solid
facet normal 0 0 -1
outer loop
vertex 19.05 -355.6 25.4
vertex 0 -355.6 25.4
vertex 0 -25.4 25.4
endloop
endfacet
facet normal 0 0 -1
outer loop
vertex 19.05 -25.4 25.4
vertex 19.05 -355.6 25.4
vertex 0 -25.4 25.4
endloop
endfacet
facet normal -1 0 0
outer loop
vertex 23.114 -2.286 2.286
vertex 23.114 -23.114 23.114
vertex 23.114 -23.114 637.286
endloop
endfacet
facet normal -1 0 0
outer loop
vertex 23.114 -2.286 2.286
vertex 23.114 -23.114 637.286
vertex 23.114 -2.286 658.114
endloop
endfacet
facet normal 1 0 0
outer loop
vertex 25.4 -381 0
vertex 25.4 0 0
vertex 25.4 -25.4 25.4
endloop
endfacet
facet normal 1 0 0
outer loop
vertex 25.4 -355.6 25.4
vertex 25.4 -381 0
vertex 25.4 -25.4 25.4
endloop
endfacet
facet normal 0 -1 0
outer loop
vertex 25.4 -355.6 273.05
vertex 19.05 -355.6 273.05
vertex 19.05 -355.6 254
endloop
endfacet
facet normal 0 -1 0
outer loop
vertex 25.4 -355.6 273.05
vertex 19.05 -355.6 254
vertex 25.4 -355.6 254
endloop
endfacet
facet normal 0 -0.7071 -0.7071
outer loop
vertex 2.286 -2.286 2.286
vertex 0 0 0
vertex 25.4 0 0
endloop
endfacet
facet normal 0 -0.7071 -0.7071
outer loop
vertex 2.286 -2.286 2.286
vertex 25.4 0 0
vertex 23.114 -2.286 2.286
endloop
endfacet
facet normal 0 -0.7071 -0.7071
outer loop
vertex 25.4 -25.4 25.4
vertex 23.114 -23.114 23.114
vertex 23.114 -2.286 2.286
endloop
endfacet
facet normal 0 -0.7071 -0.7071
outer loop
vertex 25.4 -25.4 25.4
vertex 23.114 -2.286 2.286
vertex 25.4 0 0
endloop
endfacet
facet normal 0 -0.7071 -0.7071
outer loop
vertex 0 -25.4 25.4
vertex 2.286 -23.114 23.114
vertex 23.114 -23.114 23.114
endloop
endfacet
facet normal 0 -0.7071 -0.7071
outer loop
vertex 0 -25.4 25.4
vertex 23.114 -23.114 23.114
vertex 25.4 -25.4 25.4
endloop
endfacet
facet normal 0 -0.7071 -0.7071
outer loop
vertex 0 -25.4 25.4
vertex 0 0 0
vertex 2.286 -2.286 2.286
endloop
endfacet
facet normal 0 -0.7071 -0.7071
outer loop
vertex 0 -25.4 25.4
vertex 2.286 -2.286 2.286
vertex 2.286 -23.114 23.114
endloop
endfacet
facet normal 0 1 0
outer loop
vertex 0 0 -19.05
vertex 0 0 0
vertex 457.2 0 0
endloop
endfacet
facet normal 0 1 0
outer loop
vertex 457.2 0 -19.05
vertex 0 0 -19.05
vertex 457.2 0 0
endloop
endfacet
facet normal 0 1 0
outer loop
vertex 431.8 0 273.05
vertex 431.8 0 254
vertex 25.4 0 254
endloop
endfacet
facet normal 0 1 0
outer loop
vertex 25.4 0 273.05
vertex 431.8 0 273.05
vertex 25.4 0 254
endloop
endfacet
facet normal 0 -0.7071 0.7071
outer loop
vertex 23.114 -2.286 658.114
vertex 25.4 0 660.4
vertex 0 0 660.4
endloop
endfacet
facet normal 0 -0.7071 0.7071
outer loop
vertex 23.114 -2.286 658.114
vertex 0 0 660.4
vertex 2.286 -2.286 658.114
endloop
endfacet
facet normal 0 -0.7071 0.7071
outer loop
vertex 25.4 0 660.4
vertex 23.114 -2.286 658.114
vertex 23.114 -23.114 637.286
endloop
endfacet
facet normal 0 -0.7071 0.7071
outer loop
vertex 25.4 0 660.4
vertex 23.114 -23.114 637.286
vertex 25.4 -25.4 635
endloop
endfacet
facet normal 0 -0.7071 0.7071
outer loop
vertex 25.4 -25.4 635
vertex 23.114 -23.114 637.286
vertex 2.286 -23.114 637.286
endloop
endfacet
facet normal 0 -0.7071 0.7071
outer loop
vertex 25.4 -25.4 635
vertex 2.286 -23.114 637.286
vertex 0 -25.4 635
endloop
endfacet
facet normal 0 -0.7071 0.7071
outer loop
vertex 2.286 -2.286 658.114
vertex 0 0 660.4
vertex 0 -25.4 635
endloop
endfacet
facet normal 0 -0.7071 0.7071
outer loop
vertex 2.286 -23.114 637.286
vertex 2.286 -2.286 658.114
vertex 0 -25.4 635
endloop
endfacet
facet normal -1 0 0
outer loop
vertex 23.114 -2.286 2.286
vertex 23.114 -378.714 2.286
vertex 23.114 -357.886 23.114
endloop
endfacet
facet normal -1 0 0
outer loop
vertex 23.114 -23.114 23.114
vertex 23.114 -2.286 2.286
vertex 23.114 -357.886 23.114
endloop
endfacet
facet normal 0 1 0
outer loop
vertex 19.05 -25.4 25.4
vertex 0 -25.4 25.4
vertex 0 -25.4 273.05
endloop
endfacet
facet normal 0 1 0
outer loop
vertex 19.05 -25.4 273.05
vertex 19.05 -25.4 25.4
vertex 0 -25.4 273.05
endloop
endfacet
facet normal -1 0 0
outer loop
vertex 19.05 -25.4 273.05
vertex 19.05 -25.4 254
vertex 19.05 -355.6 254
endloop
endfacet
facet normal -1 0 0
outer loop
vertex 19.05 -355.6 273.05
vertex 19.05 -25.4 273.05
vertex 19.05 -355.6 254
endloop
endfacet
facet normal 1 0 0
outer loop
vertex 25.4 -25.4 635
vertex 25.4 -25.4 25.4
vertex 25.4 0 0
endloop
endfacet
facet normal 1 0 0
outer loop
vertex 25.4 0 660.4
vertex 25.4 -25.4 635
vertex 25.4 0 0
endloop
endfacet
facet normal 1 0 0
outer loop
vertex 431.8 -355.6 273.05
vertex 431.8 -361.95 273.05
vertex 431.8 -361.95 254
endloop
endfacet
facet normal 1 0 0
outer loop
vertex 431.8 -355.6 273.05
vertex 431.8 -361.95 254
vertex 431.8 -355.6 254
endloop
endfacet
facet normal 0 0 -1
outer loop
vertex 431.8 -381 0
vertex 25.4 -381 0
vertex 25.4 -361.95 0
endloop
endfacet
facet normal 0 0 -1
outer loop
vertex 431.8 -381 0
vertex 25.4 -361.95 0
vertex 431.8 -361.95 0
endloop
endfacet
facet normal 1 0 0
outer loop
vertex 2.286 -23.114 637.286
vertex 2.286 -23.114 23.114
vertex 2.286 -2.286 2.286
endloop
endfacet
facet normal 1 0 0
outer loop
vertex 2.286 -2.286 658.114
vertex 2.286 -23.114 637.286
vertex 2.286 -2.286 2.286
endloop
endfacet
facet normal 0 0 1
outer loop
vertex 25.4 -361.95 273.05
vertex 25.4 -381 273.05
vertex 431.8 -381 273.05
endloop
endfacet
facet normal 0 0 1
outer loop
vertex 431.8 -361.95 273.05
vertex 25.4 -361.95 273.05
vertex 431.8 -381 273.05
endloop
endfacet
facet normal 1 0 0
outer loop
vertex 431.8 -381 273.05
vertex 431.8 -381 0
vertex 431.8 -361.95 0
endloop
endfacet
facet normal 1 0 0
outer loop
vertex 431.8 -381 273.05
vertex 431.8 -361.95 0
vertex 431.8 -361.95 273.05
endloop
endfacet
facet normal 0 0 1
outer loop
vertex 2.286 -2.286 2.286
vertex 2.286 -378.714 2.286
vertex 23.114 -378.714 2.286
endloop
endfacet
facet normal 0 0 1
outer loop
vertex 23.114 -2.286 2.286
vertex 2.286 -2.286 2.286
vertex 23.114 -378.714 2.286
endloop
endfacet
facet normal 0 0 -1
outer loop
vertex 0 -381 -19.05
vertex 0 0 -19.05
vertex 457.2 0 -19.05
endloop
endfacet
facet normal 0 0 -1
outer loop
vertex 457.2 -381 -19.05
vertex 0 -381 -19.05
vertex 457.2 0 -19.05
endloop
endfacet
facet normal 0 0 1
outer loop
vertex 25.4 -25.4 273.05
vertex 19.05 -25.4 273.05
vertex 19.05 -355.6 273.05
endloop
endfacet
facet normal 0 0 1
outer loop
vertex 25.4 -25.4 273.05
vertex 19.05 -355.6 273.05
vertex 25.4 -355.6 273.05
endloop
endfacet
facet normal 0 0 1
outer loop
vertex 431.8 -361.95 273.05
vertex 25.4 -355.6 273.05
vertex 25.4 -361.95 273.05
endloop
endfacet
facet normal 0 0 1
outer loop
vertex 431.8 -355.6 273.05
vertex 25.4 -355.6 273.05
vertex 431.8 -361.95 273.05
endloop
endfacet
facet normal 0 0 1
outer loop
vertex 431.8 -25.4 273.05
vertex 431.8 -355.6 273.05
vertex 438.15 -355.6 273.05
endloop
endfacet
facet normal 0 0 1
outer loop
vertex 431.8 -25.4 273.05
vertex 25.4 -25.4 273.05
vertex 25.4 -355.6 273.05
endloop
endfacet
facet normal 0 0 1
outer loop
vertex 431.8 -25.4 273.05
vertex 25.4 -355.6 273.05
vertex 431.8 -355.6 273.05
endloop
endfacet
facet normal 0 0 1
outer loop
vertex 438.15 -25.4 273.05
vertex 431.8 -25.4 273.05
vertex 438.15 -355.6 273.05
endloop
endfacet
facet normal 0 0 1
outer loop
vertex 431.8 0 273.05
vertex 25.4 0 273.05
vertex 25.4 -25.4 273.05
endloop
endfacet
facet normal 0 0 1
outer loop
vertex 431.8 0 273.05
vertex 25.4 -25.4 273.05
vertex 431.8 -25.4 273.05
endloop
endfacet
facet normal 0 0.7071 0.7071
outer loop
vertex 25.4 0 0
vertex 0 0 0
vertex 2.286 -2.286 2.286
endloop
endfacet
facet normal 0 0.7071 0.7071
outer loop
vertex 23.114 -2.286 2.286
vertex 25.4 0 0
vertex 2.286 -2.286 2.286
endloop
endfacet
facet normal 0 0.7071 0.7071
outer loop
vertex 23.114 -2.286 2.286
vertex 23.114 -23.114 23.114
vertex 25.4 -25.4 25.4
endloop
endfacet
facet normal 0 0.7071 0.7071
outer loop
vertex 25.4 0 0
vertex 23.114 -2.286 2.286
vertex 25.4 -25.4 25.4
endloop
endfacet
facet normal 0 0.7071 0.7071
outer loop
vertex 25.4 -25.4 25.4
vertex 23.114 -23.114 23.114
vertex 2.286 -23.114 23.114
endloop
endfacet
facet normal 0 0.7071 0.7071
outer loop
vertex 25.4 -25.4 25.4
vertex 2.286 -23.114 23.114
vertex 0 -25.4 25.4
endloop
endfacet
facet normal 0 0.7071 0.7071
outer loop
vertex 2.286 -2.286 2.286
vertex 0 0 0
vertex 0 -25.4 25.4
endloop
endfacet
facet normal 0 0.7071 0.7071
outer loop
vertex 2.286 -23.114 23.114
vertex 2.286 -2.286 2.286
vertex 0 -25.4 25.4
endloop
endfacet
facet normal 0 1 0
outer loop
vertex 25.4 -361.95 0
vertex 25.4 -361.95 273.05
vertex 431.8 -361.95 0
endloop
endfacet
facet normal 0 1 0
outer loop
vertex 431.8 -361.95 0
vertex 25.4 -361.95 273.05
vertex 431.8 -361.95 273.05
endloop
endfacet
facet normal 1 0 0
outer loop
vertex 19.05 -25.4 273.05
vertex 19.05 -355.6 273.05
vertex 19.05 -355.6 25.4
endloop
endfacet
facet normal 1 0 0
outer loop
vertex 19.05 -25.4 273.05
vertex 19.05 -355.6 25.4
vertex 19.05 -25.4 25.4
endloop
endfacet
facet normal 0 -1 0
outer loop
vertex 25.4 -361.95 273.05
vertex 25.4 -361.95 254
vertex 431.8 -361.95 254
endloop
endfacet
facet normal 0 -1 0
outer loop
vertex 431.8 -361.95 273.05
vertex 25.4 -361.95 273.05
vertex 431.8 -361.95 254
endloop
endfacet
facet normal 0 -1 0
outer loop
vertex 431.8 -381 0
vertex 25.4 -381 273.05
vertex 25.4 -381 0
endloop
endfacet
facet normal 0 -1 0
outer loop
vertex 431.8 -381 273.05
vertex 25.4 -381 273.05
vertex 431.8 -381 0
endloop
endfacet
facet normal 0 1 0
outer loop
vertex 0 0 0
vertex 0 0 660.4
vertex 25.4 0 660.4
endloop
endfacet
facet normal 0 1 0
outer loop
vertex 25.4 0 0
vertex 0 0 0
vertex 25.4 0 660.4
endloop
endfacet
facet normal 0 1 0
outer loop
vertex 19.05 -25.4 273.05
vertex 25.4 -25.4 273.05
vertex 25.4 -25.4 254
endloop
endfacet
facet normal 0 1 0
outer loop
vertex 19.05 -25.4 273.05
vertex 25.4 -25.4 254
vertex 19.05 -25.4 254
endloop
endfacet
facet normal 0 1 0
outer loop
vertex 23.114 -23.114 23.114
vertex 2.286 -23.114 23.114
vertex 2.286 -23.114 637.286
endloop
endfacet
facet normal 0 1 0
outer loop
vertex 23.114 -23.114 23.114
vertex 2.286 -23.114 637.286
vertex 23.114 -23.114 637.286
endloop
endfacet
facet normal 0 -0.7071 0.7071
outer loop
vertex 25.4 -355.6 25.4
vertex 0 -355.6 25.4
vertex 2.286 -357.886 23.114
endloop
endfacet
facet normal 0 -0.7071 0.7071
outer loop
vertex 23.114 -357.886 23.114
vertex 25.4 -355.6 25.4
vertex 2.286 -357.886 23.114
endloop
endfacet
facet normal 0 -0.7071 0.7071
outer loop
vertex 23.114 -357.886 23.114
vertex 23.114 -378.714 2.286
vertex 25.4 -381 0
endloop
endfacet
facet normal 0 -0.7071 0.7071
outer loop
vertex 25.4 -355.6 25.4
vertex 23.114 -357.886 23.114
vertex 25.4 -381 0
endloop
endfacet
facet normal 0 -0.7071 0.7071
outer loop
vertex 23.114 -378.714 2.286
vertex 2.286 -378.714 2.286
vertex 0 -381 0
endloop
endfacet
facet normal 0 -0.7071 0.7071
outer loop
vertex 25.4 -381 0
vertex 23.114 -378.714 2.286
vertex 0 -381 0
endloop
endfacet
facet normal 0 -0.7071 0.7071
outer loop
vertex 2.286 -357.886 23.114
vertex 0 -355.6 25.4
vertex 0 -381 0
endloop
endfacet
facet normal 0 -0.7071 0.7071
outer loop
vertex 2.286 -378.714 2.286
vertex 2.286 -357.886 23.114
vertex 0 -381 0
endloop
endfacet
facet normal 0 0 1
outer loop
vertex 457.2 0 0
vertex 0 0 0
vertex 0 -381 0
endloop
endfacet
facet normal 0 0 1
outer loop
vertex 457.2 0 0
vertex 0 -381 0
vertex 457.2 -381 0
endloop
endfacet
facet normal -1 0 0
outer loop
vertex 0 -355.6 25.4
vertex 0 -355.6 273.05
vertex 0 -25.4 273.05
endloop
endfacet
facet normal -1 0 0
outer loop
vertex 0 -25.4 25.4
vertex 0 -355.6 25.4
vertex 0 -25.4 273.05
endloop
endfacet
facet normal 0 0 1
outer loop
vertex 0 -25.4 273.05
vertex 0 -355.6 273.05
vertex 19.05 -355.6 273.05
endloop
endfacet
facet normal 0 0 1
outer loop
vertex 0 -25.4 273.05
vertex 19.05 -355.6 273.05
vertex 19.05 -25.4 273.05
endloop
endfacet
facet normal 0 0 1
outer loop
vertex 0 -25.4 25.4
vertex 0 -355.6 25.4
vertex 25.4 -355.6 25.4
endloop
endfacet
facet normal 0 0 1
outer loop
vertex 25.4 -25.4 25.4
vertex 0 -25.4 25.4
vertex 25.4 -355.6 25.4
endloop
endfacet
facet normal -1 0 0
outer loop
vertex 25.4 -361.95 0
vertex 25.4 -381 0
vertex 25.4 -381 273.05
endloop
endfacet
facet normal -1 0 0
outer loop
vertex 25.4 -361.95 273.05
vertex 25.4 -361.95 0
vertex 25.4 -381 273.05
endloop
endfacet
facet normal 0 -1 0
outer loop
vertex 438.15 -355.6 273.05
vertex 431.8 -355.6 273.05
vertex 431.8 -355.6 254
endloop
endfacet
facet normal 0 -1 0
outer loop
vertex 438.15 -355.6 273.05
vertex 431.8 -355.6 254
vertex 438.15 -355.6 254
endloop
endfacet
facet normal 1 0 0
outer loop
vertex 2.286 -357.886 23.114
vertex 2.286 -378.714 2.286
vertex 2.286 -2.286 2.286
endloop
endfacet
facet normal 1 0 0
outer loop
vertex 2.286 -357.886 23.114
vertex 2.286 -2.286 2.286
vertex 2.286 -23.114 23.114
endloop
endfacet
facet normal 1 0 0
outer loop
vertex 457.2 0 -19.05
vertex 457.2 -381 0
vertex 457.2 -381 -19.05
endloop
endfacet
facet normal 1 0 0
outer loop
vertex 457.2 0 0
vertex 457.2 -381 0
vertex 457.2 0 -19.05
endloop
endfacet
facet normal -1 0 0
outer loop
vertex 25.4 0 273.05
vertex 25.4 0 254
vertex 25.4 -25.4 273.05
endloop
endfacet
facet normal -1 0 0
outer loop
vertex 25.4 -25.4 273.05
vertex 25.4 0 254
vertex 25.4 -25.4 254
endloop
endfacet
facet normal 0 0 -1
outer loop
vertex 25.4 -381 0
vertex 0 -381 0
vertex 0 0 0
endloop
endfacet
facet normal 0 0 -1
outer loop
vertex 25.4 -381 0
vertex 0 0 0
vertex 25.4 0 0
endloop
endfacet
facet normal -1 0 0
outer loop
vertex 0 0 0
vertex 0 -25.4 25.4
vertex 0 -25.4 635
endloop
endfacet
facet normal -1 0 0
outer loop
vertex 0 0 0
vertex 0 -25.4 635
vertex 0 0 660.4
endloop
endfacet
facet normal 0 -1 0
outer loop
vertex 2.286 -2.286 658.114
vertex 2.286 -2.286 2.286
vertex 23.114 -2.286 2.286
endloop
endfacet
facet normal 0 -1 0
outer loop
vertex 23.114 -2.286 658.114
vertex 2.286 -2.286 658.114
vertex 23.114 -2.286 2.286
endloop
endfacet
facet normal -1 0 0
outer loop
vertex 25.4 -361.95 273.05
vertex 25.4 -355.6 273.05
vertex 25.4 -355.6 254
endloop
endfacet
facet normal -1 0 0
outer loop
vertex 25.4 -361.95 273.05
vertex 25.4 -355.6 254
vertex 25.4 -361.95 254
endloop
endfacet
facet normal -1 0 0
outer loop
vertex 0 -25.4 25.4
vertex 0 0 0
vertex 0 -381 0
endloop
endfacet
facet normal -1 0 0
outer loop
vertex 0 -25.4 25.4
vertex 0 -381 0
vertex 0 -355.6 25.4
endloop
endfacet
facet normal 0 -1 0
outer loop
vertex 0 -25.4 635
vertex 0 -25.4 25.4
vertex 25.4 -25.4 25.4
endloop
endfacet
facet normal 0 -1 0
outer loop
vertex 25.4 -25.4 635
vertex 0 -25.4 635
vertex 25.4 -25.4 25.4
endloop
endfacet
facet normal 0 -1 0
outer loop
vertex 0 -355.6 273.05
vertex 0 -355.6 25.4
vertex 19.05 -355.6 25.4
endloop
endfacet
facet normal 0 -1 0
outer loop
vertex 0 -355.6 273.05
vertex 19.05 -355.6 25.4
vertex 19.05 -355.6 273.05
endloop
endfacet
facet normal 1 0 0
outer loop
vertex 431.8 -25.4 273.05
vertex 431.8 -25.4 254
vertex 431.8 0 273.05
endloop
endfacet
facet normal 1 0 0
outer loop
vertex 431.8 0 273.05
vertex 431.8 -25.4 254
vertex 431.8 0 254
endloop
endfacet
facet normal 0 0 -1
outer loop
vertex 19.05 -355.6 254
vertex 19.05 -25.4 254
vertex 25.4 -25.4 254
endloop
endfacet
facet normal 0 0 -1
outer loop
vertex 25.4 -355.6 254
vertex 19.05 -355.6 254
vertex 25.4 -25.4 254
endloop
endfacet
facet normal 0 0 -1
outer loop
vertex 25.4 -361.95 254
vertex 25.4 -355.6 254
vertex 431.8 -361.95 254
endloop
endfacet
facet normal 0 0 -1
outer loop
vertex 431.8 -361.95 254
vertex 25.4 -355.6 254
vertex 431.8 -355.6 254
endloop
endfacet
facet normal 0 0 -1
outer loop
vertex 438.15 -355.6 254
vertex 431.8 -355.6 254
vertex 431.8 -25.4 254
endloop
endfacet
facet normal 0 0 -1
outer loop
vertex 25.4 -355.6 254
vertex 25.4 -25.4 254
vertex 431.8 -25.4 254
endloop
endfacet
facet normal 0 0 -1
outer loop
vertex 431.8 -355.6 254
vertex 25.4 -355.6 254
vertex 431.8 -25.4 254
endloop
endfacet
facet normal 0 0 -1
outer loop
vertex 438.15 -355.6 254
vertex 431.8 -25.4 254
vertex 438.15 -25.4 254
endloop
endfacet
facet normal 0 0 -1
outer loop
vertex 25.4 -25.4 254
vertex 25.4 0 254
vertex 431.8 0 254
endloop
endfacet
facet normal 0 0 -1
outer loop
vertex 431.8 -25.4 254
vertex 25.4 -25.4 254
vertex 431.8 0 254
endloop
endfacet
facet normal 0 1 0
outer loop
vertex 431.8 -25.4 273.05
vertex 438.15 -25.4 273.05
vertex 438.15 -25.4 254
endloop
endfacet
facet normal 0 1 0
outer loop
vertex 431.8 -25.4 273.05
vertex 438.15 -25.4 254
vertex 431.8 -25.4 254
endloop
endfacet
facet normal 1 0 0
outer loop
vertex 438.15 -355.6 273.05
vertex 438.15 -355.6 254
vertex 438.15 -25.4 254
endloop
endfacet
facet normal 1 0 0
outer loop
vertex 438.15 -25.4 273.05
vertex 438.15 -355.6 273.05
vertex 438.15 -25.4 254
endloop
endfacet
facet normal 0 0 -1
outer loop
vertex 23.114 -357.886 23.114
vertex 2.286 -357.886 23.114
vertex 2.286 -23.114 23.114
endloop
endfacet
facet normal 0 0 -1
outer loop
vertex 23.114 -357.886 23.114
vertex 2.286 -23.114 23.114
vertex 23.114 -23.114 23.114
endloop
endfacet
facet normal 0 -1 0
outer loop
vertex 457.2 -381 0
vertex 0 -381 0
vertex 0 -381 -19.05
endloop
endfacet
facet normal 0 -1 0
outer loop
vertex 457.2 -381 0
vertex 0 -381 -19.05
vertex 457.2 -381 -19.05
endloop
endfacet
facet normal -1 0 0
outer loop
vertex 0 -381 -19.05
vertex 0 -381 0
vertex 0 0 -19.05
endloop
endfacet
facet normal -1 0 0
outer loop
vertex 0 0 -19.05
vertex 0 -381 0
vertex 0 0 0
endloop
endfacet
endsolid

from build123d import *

# Parameters (mm, degrees)
F0_W      = 25.4
F0_H      = 25.4
F0_W_2    = 20.828
F0_H_2    = 20.828
F1_DEPTH  = 660.4
F3_DEPTH  = 25.4
F5_DEPTH  = 25.4
F6_W      = 25.4
F6_H      = 25.4
F6_W_2    = 20.828
F6_H_2    = 20.828
F7_DEPTH  = 381
F9_DEPTH  = 25.4
F10_W     = 457.2
F10_H     = 381
F11_DEPTH = 19.05
F14_DEPTH = 19.05
F15_W     = 330.2
F15_H     = 247.65
F16_DEPTH = 19.05
F17_W     = 406.4
F17_H     = 273.05
F18_DEPTH = 19.05


with BuildPart() as f1:
    # F0 (on Top) → F1 (new body)
    with BuildSketch(Plane.XY):
        with Locations((12.7, -12.7)):
            Rectangle(F0_W, F0_H)
        with Locations((12.7, -12.7)):
            Rectangle(F0_W_2, F0_H_2, mode=Mode.SUBTRACT)
    extrude(amount=F1_DEPTH)

    # F2 (on Right) → F3 (cut)
    with BuildSketch(Plane.YZ):
        Polygon((-25.4, 0), (0, 0), (-25.4, 25.4), align=None)
    extrude(amount=F3_DEPTH, mode=Mode.SUBTRACT)

    # F4 (on face) → F5 (cut, through all)
    with BuildSketch(Plane(origin=(0, 0, 0), x_dir=(0, -1, 0), z_dir=(-1, 0, 0))):
        Polygon((25.4, 660.4), (0, 660.4), (25.4, 635), align=None)
    extrude(amount=-F5_DEPTH, mode=Mode.SUBTRACT)


with BuildPart() as f7:
    # F6 (on Front) → F7 (new body)
    with BuildSketch(Plane.XZ):
        with Locations((12.7, 12.7)):
            Rectangle(F6_W, F6_H)
        with Locations((12.7, 12.7)):
            Rectangle(F6_W_2, F6_H_2, mode=Mode.SUBTRACT)
    extrude(amount=F7_DEPTH)

    # F8 (on face) → F9 (cut, through all)
    with BuildSketch(Plane(origin=(0, 0, 0), x_dir=(0, -1, 0), z_dir=(-1, 0, 0))):
        Polygon((355.6, 25.4), (381, 0), (381, 25.4), align=None)
        Polygon((0, 25.4), (0, 0), (25.4, 25.4), align=None)
    extrude(amount=-F9_DEPTH, mode=Mode.SUBTRACT)


with BuildPart() as f11:
    # F10 (on Top) → F11 (new body)
    with BuildSketch(Plane.XY):
        with Locations((228.6, -190.5)):
            Rectangle(F10_W, F10_H)
    extrude(amount=-F11_DEPTH)


with BuildPart() as f14:
    # F13 (on offset) → F14 (new body)
    with BuildSketch(Plane.XY.offset(254)):
        Polygon((431.8, 0), (25.4, 0), (25.4, -25.4), (19.05, -25.4), (19.05, -355.6), (25.4000000002, -355.6), (25.4, -361.95), (431.8, -361.95), (431.8, -355.6), (438.15, -355.6), (438.15, -25.4), (431.8, -25.4), align=None)
    extrude(amount=F14_DEPTH)


with BuildPart() as f16:
    # F15 (on Right) → F16 (new body)
    with BuildSketch(Plane.YZ):
        with Locations((-190.5, 149.225)):
            Rectangle(F15_W, F15_H)
    extrude(amount=F16_DEPTH)


with BuildPart() as f18:
    # F17 (on face) → F18 (new body)
    with BuildSketch(Plane.XZ.offset(381)):
        with Locations((228.6, 136.525)):
            Rectangle(F17_W, F17_H)
    extrude(amount=-F18_DEPTH)


solid = Compound([f1.part, f7.part, f11.part, f14.part, f16.part, f18.part])
